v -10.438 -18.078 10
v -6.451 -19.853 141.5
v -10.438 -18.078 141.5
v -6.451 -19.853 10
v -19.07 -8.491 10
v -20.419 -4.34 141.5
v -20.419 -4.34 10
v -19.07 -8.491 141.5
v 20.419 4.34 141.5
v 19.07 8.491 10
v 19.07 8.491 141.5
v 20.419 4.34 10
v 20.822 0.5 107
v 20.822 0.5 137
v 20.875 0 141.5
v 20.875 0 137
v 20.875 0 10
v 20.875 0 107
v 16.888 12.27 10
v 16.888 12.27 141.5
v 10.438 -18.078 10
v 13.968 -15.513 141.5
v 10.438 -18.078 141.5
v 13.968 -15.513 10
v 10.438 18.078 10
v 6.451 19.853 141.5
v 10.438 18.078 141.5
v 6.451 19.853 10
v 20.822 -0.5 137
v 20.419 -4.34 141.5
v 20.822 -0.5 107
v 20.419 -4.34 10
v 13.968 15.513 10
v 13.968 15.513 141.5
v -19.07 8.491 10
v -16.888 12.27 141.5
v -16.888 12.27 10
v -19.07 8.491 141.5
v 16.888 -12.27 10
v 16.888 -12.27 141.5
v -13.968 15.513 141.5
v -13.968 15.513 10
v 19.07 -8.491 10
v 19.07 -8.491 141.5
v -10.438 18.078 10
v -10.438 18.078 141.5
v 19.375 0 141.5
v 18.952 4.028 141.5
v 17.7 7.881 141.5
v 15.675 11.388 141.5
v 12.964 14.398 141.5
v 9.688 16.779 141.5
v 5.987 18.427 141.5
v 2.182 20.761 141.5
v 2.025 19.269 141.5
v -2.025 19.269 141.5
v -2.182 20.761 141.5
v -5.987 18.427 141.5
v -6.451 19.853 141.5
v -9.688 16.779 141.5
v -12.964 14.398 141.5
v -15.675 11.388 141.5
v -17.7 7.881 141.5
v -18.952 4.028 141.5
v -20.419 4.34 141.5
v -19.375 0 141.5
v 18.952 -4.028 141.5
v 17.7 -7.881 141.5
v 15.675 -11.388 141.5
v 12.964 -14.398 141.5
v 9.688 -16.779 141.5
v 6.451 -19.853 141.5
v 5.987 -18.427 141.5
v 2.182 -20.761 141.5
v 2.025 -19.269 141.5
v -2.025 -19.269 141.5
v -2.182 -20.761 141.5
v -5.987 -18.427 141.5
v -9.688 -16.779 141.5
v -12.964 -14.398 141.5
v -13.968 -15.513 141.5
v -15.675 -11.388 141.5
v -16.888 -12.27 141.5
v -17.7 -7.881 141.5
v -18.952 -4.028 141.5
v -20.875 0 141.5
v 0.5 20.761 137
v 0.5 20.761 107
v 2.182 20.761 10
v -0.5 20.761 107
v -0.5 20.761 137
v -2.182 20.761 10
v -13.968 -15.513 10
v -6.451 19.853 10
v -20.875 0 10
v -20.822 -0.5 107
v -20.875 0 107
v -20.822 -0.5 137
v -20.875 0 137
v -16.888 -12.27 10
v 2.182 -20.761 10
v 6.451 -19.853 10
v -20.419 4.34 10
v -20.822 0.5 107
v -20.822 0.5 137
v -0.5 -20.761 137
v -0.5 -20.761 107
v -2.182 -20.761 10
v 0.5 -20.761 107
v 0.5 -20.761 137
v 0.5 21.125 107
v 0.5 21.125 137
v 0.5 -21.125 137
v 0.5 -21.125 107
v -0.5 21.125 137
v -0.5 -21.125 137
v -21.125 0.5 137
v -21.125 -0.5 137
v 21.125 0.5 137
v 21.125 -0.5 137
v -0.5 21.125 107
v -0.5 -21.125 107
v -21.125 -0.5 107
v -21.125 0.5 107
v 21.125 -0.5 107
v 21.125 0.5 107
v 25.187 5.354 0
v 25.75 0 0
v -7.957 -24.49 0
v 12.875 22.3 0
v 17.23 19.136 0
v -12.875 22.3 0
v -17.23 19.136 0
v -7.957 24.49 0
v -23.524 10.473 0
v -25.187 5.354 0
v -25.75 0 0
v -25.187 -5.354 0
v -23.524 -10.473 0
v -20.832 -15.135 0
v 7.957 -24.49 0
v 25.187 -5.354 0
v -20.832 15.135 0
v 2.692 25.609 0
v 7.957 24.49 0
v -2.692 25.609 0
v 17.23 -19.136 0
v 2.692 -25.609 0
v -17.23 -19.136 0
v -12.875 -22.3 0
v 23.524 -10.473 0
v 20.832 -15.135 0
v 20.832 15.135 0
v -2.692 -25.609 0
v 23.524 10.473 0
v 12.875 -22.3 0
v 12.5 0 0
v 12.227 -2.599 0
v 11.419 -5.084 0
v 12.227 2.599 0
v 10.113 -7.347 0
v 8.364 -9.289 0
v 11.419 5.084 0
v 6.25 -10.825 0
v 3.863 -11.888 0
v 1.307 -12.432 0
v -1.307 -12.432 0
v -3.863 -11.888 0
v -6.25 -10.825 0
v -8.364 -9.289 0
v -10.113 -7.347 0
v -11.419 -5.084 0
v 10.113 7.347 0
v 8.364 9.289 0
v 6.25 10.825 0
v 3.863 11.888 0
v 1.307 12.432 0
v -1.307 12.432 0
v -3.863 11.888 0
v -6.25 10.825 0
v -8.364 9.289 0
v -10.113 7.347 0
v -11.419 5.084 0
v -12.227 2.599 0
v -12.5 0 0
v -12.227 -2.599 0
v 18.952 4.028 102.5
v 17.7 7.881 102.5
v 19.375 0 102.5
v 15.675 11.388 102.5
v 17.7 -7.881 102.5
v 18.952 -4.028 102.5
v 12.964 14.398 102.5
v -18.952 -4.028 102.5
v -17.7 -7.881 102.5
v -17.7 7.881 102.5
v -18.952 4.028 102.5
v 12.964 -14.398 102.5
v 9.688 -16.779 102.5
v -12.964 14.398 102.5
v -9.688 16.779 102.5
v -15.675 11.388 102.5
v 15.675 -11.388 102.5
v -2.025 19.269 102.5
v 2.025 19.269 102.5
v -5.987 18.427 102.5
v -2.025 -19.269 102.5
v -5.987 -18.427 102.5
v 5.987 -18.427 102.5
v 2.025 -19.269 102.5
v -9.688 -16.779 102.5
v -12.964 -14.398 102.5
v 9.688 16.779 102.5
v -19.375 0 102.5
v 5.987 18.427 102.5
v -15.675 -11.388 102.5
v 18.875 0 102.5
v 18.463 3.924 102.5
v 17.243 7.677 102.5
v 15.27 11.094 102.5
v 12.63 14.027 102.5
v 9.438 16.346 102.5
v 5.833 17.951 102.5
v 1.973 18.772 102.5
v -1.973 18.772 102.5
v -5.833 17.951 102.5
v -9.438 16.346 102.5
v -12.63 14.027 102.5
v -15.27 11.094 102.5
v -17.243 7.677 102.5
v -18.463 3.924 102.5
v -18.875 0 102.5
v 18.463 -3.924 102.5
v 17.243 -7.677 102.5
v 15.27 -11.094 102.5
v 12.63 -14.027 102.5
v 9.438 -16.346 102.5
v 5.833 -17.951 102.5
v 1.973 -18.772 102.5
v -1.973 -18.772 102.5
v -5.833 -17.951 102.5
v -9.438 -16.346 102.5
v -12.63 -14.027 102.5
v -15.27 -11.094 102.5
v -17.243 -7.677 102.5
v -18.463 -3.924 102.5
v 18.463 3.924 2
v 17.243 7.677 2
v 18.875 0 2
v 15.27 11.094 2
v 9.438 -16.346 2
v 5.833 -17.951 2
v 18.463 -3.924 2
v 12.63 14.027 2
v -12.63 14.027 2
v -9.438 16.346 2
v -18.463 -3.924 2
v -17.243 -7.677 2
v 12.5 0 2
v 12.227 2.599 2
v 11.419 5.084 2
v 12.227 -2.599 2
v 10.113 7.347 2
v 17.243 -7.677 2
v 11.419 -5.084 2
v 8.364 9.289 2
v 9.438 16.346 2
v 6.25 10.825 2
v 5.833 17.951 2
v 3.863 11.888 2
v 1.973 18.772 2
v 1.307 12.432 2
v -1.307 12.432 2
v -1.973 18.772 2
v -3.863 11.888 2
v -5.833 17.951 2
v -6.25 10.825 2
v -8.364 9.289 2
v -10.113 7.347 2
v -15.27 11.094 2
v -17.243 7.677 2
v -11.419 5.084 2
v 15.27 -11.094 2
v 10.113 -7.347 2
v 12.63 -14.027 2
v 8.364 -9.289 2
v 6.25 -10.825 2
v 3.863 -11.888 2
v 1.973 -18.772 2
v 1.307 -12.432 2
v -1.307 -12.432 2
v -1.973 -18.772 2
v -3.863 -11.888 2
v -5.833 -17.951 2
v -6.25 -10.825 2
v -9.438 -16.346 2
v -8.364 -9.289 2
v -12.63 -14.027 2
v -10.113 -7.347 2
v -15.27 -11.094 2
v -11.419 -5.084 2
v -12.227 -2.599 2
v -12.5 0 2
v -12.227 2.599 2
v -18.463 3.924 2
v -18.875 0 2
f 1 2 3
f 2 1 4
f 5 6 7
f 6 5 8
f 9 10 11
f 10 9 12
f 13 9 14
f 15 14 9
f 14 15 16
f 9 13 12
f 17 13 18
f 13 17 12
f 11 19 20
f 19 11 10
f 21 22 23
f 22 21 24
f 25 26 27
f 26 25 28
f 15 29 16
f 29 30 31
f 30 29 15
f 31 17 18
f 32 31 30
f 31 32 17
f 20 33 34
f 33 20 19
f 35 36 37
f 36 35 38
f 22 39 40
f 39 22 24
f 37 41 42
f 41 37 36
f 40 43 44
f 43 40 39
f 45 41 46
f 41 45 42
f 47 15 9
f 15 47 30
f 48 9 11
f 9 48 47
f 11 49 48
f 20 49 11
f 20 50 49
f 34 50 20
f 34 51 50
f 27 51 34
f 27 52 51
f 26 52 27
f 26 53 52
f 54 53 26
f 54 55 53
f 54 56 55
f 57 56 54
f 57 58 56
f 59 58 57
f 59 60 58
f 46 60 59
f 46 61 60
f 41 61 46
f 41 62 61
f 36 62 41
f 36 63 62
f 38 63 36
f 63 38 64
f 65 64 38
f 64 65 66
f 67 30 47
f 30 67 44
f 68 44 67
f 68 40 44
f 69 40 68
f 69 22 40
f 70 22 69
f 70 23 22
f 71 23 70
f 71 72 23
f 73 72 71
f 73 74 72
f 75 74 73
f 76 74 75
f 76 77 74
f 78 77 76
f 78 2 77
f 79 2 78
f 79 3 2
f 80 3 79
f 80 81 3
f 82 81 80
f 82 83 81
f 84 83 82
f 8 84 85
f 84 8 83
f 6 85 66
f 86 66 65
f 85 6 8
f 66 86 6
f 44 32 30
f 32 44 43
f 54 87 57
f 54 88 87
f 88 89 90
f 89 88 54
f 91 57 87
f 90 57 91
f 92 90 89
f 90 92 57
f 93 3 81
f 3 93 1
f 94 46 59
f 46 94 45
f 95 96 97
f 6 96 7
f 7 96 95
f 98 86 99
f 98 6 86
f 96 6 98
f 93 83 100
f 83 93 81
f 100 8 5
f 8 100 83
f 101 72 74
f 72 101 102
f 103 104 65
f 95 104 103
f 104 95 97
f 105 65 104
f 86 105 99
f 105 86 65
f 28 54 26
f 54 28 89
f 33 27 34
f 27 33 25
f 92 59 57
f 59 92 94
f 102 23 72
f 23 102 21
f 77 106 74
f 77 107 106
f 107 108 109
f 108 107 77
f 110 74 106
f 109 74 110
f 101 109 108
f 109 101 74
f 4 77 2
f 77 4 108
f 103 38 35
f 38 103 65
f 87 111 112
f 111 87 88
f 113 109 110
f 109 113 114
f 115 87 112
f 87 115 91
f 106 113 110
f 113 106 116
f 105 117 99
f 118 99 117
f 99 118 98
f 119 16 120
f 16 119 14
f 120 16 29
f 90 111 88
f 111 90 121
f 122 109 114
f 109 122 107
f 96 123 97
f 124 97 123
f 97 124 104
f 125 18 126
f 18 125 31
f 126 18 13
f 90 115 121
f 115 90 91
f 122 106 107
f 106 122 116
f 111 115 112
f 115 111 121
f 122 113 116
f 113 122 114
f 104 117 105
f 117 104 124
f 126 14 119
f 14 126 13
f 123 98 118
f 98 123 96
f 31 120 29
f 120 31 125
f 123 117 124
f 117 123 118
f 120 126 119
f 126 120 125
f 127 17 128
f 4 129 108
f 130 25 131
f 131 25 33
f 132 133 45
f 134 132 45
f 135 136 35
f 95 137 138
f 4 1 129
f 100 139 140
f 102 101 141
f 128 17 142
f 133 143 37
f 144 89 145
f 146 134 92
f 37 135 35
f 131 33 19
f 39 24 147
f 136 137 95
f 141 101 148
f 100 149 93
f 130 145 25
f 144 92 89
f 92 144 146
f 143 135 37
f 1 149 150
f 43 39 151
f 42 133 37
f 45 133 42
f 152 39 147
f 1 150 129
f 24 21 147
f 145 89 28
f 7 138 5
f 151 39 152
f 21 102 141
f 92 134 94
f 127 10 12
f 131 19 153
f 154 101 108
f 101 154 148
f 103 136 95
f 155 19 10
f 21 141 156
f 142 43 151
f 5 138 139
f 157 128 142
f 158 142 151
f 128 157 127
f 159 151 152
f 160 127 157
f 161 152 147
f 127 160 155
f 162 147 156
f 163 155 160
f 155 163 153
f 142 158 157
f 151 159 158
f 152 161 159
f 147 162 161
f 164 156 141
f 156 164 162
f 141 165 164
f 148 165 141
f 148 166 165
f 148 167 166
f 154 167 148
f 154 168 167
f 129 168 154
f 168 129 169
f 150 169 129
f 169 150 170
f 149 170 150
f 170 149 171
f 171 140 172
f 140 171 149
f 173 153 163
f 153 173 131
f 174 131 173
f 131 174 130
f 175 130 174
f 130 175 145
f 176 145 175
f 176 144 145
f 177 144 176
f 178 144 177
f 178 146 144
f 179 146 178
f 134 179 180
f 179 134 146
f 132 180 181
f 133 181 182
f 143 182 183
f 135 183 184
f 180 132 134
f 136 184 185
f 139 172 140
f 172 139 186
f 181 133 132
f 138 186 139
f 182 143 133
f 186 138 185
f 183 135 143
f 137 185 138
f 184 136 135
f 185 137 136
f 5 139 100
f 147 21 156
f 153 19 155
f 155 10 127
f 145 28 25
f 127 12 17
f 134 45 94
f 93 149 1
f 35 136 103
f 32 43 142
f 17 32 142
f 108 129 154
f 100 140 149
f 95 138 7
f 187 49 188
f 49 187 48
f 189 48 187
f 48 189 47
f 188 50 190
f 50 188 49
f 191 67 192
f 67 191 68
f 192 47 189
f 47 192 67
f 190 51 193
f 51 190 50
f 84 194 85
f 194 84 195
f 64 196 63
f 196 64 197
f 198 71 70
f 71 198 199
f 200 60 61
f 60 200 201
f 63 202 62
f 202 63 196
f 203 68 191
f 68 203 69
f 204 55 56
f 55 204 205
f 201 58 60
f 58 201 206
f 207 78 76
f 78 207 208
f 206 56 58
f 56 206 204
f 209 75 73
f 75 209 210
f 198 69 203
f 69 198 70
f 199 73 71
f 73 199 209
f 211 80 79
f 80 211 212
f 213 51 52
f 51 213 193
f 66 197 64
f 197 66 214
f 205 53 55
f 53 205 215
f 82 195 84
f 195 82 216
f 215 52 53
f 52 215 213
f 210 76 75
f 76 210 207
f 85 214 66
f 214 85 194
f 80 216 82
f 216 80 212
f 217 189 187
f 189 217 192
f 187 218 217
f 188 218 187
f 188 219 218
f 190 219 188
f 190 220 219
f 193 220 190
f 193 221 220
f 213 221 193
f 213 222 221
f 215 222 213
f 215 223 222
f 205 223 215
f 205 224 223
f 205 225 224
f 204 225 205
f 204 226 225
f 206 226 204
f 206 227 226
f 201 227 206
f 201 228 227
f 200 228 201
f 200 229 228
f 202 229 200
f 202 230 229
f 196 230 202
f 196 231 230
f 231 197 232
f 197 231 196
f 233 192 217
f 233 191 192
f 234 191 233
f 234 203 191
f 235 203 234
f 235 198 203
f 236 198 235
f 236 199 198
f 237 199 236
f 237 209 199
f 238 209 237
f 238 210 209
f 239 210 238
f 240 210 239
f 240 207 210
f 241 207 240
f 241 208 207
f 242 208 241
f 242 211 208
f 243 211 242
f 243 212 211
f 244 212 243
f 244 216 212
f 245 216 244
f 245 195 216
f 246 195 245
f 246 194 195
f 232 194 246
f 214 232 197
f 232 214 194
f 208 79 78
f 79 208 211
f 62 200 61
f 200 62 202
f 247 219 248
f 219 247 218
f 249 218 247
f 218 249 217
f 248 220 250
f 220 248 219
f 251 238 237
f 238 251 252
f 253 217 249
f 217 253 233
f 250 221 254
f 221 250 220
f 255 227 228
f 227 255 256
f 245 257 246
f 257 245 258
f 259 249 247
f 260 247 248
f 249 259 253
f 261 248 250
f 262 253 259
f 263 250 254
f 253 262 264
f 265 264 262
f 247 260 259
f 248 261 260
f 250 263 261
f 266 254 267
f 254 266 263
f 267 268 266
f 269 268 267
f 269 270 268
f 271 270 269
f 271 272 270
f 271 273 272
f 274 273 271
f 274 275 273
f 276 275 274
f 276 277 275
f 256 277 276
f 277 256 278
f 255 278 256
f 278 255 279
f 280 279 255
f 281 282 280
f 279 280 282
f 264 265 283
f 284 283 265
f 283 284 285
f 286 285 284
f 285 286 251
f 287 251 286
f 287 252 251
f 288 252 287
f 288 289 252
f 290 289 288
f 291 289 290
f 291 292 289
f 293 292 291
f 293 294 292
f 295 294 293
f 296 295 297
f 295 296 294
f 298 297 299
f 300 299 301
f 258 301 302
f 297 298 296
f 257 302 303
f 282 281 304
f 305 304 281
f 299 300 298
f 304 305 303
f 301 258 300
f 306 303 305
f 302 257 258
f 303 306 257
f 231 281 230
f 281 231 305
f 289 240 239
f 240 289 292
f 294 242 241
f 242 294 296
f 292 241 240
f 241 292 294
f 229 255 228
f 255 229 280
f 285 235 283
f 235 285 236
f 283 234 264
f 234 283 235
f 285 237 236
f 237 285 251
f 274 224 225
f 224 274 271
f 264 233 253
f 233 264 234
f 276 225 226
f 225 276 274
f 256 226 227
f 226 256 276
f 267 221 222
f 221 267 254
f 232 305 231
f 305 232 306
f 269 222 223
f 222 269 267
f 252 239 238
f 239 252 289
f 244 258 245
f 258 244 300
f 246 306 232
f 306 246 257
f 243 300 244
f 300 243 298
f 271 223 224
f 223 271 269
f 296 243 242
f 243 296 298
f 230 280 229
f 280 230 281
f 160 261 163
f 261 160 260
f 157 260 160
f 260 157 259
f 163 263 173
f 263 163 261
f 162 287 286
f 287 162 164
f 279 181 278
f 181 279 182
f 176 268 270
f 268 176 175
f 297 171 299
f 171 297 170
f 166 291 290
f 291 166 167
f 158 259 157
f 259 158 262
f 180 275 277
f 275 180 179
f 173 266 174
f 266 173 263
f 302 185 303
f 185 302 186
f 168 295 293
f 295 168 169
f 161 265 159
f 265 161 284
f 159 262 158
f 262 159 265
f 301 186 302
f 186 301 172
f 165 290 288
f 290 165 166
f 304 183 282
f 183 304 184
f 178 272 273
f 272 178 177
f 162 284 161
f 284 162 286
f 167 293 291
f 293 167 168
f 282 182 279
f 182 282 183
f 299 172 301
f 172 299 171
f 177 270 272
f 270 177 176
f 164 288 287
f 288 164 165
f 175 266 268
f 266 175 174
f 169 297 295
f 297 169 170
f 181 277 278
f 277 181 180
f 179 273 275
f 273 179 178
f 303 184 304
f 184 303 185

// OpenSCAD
/* [Tube Foot] */

// original 66.5, new 141.5
total_height_text_box = 141.5;

// Thickness of the main tube body
shell_width = 2;

// Tube thickness to accept the tube above it, the rest of the tube can be thicker
top_shell_width = 1.5;

// Diameter of the outside of the tube
outer_diameter_textbox = 41.75;

// Foot diameter, make it bigger to spread the weight.
foot_diameter_text_box = 51.5;

// Hight of the foot relief 
foot_relief_height_text_box = 10;

// Hole diameter at bottom of foot
foot_hole_diameter_text_box = 25;

// Vertical line length
friction_line_height_text_box = 30;

// Width of vertical friction line
friction_line_width_text_box = 1;

// Depth of vertical friction line, increase for more friction
friction_line_depth_text_box = 0.25;

// offset of vertical friction line
friction_line_top_offset_text_box = 4.5;

main_height_text_box = total_height_text_box - foot_relief_height_text_box;

top_innertube_height = friction_line_height_text_box + 2*friction_line_top_offset_text_box;


module build_tube(){
    difference(){
        union(){
        
            // Full tube
            translate([0, 0, foot_relief_height_text_box]) cylinder(main_height_text_box, r=outer_diameter_textbox/2, center=false);

            // Fiction line
            translate([0, 0, foot_relief_height_text_box + main_height_text_box - friction_line_top_offset_text_box - friction_line_height_text_box/2]) cube([friction_line_width_text_box, outer_diameter_textbox + 2*friction_line_depth_text_box, friction_line_height_text_box], center=true);
            
            // Fiction line
            rotate([0,0,90]) translate([0, 0, foot_relief_height_text_box + main_height_text_box - friction_line_top_offset_text_box - friction_line_height_text_box/2]) cube([friction_line_width_text_box, outer_diameter_textbox + 2*friction_line_depth_text_box, friction_line_height_text_box], center=true);
            
            // Main foot
            cylinder(foot_relief_height_text_box, r1=foot_diameter_text_box/2, r2=outer_diameter_textbox/2, center=false);
            
        }
            
        
        // Make top part of tube correct shell width to fit with original parts
        translate([0, 0, foot_relief_height_text_box + main_height_text_box - top_innertube_height]) cylinder(top_innertube_height, r=(outer_diameter_textbox - 2*top_shell_width)/2, center=false);
            
        // Hollow part of tube
        translate([0, 0, shell_width]) cylinder(main_height_text_box + foot_relief_height_text_box, r= (outer_diameter_textbox - 2*shell_width)/2, center=false);
        
        // Bottom foot hole
        cylinder(foot_relief_height_text_box * 3, r=foot_hole_diameter_text_box/2, center=true);

    }
}

build_tube();
    
    
